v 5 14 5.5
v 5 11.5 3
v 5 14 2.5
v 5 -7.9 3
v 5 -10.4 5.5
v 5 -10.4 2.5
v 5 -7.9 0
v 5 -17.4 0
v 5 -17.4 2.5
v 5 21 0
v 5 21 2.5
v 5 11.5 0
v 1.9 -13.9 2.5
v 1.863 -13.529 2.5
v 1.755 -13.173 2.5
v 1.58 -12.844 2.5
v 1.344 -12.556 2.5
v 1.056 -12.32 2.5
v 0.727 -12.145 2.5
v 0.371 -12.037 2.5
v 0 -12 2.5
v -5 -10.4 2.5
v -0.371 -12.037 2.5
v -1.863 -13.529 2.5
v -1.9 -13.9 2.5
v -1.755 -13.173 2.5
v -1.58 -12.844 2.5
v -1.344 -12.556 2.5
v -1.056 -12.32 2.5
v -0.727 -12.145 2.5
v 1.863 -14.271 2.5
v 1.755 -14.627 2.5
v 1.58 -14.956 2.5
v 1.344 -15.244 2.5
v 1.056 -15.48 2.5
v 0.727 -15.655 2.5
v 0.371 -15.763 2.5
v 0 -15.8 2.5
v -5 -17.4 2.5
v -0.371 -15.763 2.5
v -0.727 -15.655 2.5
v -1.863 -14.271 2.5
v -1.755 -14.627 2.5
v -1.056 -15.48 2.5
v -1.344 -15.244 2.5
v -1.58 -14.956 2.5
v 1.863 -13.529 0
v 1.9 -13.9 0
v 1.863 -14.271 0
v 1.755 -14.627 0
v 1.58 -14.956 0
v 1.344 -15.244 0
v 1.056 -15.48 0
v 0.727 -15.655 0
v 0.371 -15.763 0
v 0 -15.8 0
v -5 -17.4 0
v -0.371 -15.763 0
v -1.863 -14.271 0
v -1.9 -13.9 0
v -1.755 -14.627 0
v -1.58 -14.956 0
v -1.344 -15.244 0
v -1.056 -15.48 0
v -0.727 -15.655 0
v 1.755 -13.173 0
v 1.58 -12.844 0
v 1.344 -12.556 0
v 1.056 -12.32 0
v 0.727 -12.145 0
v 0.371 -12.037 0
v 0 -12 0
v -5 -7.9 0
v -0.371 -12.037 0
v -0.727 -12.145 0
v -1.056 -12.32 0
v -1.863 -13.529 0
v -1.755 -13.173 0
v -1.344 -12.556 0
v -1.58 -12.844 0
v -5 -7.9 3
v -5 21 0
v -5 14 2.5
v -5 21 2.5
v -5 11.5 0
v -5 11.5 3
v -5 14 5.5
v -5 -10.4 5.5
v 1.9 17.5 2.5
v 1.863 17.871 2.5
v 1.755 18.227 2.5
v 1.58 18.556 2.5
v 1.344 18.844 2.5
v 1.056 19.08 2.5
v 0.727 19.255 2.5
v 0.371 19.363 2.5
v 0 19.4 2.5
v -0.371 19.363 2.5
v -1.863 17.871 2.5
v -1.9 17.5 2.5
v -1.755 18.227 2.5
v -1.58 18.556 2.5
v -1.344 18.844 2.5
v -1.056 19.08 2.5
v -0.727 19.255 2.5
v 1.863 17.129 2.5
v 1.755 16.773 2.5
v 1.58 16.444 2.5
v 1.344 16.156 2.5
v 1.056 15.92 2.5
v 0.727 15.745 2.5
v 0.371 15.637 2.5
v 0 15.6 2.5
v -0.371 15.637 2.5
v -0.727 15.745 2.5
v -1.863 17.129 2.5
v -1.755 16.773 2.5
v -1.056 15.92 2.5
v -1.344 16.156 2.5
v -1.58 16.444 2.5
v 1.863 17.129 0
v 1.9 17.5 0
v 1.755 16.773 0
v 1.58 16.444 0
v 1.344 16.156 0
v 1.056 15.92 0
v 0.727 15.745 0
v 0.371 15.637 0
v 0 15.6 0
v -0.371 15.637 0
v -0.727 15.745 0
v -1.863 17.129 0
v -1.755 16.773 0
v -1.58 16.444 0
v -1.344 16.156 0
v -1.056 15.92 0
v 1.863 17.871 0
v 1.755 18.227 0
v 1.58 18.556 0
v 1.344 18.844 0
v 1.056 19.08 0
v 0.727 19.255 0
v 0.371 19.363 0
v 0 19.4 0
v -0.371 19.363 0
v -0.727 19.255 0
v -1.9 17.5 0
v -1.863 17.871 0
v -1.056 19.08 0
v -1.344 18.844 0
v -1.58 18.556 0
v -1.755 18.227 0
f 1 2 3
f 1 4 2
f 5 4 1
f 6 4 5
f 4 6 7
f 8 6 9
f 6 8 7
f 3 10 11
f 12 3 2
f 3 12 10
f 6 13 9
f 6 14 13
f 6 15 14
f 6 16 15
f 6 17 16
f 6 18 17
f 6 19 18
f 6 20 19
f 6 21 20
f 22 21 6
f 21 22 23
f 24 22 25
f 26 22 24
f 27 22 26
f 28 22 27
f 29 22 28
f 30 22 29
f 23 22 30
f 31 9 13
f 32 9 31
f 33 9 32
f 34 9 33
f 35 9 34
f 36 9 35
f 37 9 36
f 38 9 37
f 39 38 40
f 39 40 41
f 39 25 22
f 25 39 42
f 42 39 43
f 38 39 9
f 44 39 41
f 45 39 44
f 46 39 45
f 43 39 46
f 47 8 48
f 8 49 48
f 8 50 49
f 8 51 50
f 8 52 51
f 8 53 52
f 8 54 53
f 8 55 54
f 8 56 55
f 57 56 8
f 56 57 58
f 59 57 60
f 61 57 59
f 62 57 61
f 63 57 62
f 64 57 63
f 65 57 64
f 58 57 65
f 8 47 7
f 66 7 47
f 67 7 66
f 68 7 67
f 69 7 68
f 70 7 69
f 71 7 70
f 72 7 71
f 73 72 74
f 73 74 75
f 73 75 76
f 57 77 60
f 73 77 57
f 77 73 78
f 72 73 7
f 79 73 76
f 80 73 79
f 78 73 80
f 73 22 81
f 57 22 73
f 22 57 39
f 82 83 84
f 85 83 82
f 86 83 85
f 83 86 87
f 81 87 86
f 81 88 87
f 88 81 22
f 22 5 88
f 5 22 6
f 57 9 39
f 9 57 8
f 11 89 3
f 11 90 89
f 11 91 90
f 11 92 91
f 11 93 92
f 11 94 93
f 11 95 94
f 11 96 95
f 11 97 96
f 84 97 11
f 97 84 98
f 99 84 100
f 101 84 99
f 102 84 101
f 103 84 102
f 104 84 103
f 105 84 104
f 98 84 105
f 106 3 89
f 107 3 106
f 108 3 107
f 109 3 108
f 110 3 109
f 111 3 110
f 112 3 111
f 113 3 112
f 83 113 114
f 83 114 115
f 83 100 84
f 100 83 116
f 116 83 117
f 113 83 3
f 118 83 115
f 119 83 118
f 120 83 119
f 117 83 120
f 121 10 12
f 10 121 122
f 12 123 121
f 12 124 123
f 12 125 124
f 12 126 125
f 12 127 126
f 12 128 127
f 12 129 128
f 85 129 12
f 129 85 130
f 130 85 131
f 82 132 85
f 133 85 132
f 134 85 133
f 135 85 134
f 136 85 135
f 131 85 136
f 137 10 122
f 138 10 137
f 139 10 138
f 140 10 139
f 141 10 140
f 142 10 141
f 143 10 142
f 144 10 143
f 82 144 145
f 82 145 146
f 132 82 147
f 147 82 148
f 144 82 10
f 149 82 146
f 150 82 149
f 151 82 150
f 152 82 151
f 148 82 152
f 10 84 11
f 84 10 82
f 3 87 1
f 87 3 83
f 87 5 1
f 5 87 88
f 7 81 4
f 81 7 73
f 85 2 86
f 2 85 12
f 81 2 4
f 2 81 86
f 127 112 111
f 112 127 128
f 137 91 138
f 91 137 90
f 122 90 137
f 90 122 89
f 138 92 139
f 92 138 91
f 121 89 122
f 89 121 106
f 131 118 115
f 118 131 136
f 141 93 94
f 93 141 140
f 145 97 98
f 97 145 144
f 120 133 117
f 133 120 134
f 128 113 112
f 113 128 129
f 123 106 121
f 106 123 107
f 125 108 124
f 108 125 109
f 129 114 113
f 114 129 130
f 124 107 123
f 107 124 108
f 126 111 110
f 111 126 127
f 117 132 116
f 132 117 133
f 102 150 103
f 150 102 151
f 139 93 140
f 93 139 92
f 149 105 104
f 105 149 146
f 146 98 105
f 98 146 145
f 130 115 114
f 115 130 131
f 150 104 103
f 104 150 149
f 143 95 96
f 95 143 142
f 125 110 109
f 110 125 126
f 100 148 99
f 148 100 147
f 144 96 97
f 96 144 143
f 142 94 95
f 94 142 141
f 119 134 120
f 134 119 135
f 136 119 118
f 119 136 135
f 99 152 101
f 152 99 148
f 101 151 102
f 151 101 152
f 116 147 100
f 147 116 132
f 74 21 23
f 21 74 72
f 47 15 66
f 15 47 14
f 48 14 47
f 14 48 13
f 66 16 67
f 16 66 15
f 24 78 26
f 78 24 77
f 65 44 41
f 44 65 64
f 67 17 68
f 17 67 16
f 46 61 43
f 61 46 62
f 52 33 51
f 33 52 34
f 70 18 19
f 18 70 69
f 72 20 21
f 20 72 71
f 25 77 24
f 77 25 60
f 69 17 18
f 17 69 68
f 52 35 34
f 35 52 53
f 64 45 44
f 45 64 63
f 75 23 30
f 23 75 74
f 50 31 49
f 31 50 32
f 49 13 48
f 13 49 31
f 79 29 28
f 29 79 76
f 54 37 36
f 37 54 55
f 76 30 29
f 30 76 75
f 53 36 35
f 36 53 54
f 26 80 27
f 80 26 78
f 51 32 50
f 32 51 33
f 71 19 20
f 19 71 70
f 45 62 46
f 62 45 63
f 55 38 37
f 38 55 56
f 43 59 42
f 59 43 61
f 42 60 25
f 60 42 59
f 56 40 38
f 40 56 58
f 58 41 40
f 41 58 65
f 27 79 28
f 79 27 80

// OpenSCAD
// file: eye_cam_bracket_dims.scad
// Camera bracket - shared by eye_cam_bracket.scad (the part) and eye_test_stand.scad (its insert
// holes), so the two can't drift apart. Coordinates: the stand's (x along the board, y up, as
// seen from the back), but z = 0 at the stand's BACK face, positive away from it.
//
// A shallow U-channel strapped across the back of the camera board at its middle (x = 0):
//
//            leg ____________________ leg
//     foot      |        bridge      |      foot        bridge underside 3.0 above the
//     =(o)======|                    |======(o)=        back face (clears the board's back
//     ----------+--------board-------+----------        parts); M3 screws into inserts
//
// The legs sit just outside the board's top and bottom edges, so they also locate it up/down.

br_pcb_top = 11.0;             // board's top edge (22 tall, centred)
br_pcb_h   = 18.4;             // MEASURED: board height at the middle (bottom edge cut back here)
br_pcb_bot = br_pcb_top - br_pcb_h;          // -7.4
br_ext     = 10;               // bracket runs this far beyond each board edge
br_rise    = 3.0;              // bridge underside above the stand's back face
br_t       = 2.5;              // material thickness (feet, legs, bridge)
br_w       = 10;               // width along the board (x)
br_clr     = 0.5;              // legs' clearance from the board's edges
// holes: centred on the flat foot (an M3 head, 5.5 across, would overlap the leg at 5 mm out)
br_leg_out = br_clr + br_t;                   // leg's outer face, measured from the board edge
br_hole_out = br_leg_out + (br_ext - br_leg_out) / 2;     // 6.5 from the board edge
br_holes_y = [br_pcb_top + br_hole_out, br_pcb_bot - br_hole_out];   // [17.5, -13.9]

module cam_bracket() {
    y0  = br_pcb_bot - br_ext;                // bottom end
    y1  = br_pcb_top + br_ext;                // top end
    yi0 = br_pcb_bot - br_clr;                // legs' inner faces
    yi1 = br_pcb_top + br_clr;
    h   = br_rise + br_t;                     // overall height
    module blk(ya, yb, za, zb) translate([-br_w / 2, ya, za]) cube([br_w, yb - ya, zb - za]);
    difference() {
        union() {
            blk(y0, yi0 - br_t, 0, br_t);                 // bottom foot
            blk(yi1 + br_t, y1, 0, br_t);                 // top foot
            blk(yi0 - br_t, yi0, 0, h);                   // legs
            blk(yi1, yi1 + br_t, 0, h);
            blk(yi0 - br_t, yi1 + br_t, br_rise, h);      // bridge
        }
        // M3 clearance holes (3.4, drawn with the hole calibration)
        for (y = br_holes_y) translate([0, y, -1]) cylinder(d = 3.4 + cal_hole, h = br_t + 2, $fn = 32);
    }
}
// main file
// Camera bracket for eye_test_stand.scad: a shallow U-channel that straps the C920 board to the
// back of the stand at its middle, with two M3 screws into heat-set inserts (one above the board,
// one below). Replaces the snap tabs. Dimensions: eye_cam_bracket_dims.scad.
//
// PRINT as modelled: feet on the bed; the bridge (~24 mm) bridges, no supports.
include <../../params.scad>
include <eye_cam_bracket_dims.scad>

cam_bracket();
